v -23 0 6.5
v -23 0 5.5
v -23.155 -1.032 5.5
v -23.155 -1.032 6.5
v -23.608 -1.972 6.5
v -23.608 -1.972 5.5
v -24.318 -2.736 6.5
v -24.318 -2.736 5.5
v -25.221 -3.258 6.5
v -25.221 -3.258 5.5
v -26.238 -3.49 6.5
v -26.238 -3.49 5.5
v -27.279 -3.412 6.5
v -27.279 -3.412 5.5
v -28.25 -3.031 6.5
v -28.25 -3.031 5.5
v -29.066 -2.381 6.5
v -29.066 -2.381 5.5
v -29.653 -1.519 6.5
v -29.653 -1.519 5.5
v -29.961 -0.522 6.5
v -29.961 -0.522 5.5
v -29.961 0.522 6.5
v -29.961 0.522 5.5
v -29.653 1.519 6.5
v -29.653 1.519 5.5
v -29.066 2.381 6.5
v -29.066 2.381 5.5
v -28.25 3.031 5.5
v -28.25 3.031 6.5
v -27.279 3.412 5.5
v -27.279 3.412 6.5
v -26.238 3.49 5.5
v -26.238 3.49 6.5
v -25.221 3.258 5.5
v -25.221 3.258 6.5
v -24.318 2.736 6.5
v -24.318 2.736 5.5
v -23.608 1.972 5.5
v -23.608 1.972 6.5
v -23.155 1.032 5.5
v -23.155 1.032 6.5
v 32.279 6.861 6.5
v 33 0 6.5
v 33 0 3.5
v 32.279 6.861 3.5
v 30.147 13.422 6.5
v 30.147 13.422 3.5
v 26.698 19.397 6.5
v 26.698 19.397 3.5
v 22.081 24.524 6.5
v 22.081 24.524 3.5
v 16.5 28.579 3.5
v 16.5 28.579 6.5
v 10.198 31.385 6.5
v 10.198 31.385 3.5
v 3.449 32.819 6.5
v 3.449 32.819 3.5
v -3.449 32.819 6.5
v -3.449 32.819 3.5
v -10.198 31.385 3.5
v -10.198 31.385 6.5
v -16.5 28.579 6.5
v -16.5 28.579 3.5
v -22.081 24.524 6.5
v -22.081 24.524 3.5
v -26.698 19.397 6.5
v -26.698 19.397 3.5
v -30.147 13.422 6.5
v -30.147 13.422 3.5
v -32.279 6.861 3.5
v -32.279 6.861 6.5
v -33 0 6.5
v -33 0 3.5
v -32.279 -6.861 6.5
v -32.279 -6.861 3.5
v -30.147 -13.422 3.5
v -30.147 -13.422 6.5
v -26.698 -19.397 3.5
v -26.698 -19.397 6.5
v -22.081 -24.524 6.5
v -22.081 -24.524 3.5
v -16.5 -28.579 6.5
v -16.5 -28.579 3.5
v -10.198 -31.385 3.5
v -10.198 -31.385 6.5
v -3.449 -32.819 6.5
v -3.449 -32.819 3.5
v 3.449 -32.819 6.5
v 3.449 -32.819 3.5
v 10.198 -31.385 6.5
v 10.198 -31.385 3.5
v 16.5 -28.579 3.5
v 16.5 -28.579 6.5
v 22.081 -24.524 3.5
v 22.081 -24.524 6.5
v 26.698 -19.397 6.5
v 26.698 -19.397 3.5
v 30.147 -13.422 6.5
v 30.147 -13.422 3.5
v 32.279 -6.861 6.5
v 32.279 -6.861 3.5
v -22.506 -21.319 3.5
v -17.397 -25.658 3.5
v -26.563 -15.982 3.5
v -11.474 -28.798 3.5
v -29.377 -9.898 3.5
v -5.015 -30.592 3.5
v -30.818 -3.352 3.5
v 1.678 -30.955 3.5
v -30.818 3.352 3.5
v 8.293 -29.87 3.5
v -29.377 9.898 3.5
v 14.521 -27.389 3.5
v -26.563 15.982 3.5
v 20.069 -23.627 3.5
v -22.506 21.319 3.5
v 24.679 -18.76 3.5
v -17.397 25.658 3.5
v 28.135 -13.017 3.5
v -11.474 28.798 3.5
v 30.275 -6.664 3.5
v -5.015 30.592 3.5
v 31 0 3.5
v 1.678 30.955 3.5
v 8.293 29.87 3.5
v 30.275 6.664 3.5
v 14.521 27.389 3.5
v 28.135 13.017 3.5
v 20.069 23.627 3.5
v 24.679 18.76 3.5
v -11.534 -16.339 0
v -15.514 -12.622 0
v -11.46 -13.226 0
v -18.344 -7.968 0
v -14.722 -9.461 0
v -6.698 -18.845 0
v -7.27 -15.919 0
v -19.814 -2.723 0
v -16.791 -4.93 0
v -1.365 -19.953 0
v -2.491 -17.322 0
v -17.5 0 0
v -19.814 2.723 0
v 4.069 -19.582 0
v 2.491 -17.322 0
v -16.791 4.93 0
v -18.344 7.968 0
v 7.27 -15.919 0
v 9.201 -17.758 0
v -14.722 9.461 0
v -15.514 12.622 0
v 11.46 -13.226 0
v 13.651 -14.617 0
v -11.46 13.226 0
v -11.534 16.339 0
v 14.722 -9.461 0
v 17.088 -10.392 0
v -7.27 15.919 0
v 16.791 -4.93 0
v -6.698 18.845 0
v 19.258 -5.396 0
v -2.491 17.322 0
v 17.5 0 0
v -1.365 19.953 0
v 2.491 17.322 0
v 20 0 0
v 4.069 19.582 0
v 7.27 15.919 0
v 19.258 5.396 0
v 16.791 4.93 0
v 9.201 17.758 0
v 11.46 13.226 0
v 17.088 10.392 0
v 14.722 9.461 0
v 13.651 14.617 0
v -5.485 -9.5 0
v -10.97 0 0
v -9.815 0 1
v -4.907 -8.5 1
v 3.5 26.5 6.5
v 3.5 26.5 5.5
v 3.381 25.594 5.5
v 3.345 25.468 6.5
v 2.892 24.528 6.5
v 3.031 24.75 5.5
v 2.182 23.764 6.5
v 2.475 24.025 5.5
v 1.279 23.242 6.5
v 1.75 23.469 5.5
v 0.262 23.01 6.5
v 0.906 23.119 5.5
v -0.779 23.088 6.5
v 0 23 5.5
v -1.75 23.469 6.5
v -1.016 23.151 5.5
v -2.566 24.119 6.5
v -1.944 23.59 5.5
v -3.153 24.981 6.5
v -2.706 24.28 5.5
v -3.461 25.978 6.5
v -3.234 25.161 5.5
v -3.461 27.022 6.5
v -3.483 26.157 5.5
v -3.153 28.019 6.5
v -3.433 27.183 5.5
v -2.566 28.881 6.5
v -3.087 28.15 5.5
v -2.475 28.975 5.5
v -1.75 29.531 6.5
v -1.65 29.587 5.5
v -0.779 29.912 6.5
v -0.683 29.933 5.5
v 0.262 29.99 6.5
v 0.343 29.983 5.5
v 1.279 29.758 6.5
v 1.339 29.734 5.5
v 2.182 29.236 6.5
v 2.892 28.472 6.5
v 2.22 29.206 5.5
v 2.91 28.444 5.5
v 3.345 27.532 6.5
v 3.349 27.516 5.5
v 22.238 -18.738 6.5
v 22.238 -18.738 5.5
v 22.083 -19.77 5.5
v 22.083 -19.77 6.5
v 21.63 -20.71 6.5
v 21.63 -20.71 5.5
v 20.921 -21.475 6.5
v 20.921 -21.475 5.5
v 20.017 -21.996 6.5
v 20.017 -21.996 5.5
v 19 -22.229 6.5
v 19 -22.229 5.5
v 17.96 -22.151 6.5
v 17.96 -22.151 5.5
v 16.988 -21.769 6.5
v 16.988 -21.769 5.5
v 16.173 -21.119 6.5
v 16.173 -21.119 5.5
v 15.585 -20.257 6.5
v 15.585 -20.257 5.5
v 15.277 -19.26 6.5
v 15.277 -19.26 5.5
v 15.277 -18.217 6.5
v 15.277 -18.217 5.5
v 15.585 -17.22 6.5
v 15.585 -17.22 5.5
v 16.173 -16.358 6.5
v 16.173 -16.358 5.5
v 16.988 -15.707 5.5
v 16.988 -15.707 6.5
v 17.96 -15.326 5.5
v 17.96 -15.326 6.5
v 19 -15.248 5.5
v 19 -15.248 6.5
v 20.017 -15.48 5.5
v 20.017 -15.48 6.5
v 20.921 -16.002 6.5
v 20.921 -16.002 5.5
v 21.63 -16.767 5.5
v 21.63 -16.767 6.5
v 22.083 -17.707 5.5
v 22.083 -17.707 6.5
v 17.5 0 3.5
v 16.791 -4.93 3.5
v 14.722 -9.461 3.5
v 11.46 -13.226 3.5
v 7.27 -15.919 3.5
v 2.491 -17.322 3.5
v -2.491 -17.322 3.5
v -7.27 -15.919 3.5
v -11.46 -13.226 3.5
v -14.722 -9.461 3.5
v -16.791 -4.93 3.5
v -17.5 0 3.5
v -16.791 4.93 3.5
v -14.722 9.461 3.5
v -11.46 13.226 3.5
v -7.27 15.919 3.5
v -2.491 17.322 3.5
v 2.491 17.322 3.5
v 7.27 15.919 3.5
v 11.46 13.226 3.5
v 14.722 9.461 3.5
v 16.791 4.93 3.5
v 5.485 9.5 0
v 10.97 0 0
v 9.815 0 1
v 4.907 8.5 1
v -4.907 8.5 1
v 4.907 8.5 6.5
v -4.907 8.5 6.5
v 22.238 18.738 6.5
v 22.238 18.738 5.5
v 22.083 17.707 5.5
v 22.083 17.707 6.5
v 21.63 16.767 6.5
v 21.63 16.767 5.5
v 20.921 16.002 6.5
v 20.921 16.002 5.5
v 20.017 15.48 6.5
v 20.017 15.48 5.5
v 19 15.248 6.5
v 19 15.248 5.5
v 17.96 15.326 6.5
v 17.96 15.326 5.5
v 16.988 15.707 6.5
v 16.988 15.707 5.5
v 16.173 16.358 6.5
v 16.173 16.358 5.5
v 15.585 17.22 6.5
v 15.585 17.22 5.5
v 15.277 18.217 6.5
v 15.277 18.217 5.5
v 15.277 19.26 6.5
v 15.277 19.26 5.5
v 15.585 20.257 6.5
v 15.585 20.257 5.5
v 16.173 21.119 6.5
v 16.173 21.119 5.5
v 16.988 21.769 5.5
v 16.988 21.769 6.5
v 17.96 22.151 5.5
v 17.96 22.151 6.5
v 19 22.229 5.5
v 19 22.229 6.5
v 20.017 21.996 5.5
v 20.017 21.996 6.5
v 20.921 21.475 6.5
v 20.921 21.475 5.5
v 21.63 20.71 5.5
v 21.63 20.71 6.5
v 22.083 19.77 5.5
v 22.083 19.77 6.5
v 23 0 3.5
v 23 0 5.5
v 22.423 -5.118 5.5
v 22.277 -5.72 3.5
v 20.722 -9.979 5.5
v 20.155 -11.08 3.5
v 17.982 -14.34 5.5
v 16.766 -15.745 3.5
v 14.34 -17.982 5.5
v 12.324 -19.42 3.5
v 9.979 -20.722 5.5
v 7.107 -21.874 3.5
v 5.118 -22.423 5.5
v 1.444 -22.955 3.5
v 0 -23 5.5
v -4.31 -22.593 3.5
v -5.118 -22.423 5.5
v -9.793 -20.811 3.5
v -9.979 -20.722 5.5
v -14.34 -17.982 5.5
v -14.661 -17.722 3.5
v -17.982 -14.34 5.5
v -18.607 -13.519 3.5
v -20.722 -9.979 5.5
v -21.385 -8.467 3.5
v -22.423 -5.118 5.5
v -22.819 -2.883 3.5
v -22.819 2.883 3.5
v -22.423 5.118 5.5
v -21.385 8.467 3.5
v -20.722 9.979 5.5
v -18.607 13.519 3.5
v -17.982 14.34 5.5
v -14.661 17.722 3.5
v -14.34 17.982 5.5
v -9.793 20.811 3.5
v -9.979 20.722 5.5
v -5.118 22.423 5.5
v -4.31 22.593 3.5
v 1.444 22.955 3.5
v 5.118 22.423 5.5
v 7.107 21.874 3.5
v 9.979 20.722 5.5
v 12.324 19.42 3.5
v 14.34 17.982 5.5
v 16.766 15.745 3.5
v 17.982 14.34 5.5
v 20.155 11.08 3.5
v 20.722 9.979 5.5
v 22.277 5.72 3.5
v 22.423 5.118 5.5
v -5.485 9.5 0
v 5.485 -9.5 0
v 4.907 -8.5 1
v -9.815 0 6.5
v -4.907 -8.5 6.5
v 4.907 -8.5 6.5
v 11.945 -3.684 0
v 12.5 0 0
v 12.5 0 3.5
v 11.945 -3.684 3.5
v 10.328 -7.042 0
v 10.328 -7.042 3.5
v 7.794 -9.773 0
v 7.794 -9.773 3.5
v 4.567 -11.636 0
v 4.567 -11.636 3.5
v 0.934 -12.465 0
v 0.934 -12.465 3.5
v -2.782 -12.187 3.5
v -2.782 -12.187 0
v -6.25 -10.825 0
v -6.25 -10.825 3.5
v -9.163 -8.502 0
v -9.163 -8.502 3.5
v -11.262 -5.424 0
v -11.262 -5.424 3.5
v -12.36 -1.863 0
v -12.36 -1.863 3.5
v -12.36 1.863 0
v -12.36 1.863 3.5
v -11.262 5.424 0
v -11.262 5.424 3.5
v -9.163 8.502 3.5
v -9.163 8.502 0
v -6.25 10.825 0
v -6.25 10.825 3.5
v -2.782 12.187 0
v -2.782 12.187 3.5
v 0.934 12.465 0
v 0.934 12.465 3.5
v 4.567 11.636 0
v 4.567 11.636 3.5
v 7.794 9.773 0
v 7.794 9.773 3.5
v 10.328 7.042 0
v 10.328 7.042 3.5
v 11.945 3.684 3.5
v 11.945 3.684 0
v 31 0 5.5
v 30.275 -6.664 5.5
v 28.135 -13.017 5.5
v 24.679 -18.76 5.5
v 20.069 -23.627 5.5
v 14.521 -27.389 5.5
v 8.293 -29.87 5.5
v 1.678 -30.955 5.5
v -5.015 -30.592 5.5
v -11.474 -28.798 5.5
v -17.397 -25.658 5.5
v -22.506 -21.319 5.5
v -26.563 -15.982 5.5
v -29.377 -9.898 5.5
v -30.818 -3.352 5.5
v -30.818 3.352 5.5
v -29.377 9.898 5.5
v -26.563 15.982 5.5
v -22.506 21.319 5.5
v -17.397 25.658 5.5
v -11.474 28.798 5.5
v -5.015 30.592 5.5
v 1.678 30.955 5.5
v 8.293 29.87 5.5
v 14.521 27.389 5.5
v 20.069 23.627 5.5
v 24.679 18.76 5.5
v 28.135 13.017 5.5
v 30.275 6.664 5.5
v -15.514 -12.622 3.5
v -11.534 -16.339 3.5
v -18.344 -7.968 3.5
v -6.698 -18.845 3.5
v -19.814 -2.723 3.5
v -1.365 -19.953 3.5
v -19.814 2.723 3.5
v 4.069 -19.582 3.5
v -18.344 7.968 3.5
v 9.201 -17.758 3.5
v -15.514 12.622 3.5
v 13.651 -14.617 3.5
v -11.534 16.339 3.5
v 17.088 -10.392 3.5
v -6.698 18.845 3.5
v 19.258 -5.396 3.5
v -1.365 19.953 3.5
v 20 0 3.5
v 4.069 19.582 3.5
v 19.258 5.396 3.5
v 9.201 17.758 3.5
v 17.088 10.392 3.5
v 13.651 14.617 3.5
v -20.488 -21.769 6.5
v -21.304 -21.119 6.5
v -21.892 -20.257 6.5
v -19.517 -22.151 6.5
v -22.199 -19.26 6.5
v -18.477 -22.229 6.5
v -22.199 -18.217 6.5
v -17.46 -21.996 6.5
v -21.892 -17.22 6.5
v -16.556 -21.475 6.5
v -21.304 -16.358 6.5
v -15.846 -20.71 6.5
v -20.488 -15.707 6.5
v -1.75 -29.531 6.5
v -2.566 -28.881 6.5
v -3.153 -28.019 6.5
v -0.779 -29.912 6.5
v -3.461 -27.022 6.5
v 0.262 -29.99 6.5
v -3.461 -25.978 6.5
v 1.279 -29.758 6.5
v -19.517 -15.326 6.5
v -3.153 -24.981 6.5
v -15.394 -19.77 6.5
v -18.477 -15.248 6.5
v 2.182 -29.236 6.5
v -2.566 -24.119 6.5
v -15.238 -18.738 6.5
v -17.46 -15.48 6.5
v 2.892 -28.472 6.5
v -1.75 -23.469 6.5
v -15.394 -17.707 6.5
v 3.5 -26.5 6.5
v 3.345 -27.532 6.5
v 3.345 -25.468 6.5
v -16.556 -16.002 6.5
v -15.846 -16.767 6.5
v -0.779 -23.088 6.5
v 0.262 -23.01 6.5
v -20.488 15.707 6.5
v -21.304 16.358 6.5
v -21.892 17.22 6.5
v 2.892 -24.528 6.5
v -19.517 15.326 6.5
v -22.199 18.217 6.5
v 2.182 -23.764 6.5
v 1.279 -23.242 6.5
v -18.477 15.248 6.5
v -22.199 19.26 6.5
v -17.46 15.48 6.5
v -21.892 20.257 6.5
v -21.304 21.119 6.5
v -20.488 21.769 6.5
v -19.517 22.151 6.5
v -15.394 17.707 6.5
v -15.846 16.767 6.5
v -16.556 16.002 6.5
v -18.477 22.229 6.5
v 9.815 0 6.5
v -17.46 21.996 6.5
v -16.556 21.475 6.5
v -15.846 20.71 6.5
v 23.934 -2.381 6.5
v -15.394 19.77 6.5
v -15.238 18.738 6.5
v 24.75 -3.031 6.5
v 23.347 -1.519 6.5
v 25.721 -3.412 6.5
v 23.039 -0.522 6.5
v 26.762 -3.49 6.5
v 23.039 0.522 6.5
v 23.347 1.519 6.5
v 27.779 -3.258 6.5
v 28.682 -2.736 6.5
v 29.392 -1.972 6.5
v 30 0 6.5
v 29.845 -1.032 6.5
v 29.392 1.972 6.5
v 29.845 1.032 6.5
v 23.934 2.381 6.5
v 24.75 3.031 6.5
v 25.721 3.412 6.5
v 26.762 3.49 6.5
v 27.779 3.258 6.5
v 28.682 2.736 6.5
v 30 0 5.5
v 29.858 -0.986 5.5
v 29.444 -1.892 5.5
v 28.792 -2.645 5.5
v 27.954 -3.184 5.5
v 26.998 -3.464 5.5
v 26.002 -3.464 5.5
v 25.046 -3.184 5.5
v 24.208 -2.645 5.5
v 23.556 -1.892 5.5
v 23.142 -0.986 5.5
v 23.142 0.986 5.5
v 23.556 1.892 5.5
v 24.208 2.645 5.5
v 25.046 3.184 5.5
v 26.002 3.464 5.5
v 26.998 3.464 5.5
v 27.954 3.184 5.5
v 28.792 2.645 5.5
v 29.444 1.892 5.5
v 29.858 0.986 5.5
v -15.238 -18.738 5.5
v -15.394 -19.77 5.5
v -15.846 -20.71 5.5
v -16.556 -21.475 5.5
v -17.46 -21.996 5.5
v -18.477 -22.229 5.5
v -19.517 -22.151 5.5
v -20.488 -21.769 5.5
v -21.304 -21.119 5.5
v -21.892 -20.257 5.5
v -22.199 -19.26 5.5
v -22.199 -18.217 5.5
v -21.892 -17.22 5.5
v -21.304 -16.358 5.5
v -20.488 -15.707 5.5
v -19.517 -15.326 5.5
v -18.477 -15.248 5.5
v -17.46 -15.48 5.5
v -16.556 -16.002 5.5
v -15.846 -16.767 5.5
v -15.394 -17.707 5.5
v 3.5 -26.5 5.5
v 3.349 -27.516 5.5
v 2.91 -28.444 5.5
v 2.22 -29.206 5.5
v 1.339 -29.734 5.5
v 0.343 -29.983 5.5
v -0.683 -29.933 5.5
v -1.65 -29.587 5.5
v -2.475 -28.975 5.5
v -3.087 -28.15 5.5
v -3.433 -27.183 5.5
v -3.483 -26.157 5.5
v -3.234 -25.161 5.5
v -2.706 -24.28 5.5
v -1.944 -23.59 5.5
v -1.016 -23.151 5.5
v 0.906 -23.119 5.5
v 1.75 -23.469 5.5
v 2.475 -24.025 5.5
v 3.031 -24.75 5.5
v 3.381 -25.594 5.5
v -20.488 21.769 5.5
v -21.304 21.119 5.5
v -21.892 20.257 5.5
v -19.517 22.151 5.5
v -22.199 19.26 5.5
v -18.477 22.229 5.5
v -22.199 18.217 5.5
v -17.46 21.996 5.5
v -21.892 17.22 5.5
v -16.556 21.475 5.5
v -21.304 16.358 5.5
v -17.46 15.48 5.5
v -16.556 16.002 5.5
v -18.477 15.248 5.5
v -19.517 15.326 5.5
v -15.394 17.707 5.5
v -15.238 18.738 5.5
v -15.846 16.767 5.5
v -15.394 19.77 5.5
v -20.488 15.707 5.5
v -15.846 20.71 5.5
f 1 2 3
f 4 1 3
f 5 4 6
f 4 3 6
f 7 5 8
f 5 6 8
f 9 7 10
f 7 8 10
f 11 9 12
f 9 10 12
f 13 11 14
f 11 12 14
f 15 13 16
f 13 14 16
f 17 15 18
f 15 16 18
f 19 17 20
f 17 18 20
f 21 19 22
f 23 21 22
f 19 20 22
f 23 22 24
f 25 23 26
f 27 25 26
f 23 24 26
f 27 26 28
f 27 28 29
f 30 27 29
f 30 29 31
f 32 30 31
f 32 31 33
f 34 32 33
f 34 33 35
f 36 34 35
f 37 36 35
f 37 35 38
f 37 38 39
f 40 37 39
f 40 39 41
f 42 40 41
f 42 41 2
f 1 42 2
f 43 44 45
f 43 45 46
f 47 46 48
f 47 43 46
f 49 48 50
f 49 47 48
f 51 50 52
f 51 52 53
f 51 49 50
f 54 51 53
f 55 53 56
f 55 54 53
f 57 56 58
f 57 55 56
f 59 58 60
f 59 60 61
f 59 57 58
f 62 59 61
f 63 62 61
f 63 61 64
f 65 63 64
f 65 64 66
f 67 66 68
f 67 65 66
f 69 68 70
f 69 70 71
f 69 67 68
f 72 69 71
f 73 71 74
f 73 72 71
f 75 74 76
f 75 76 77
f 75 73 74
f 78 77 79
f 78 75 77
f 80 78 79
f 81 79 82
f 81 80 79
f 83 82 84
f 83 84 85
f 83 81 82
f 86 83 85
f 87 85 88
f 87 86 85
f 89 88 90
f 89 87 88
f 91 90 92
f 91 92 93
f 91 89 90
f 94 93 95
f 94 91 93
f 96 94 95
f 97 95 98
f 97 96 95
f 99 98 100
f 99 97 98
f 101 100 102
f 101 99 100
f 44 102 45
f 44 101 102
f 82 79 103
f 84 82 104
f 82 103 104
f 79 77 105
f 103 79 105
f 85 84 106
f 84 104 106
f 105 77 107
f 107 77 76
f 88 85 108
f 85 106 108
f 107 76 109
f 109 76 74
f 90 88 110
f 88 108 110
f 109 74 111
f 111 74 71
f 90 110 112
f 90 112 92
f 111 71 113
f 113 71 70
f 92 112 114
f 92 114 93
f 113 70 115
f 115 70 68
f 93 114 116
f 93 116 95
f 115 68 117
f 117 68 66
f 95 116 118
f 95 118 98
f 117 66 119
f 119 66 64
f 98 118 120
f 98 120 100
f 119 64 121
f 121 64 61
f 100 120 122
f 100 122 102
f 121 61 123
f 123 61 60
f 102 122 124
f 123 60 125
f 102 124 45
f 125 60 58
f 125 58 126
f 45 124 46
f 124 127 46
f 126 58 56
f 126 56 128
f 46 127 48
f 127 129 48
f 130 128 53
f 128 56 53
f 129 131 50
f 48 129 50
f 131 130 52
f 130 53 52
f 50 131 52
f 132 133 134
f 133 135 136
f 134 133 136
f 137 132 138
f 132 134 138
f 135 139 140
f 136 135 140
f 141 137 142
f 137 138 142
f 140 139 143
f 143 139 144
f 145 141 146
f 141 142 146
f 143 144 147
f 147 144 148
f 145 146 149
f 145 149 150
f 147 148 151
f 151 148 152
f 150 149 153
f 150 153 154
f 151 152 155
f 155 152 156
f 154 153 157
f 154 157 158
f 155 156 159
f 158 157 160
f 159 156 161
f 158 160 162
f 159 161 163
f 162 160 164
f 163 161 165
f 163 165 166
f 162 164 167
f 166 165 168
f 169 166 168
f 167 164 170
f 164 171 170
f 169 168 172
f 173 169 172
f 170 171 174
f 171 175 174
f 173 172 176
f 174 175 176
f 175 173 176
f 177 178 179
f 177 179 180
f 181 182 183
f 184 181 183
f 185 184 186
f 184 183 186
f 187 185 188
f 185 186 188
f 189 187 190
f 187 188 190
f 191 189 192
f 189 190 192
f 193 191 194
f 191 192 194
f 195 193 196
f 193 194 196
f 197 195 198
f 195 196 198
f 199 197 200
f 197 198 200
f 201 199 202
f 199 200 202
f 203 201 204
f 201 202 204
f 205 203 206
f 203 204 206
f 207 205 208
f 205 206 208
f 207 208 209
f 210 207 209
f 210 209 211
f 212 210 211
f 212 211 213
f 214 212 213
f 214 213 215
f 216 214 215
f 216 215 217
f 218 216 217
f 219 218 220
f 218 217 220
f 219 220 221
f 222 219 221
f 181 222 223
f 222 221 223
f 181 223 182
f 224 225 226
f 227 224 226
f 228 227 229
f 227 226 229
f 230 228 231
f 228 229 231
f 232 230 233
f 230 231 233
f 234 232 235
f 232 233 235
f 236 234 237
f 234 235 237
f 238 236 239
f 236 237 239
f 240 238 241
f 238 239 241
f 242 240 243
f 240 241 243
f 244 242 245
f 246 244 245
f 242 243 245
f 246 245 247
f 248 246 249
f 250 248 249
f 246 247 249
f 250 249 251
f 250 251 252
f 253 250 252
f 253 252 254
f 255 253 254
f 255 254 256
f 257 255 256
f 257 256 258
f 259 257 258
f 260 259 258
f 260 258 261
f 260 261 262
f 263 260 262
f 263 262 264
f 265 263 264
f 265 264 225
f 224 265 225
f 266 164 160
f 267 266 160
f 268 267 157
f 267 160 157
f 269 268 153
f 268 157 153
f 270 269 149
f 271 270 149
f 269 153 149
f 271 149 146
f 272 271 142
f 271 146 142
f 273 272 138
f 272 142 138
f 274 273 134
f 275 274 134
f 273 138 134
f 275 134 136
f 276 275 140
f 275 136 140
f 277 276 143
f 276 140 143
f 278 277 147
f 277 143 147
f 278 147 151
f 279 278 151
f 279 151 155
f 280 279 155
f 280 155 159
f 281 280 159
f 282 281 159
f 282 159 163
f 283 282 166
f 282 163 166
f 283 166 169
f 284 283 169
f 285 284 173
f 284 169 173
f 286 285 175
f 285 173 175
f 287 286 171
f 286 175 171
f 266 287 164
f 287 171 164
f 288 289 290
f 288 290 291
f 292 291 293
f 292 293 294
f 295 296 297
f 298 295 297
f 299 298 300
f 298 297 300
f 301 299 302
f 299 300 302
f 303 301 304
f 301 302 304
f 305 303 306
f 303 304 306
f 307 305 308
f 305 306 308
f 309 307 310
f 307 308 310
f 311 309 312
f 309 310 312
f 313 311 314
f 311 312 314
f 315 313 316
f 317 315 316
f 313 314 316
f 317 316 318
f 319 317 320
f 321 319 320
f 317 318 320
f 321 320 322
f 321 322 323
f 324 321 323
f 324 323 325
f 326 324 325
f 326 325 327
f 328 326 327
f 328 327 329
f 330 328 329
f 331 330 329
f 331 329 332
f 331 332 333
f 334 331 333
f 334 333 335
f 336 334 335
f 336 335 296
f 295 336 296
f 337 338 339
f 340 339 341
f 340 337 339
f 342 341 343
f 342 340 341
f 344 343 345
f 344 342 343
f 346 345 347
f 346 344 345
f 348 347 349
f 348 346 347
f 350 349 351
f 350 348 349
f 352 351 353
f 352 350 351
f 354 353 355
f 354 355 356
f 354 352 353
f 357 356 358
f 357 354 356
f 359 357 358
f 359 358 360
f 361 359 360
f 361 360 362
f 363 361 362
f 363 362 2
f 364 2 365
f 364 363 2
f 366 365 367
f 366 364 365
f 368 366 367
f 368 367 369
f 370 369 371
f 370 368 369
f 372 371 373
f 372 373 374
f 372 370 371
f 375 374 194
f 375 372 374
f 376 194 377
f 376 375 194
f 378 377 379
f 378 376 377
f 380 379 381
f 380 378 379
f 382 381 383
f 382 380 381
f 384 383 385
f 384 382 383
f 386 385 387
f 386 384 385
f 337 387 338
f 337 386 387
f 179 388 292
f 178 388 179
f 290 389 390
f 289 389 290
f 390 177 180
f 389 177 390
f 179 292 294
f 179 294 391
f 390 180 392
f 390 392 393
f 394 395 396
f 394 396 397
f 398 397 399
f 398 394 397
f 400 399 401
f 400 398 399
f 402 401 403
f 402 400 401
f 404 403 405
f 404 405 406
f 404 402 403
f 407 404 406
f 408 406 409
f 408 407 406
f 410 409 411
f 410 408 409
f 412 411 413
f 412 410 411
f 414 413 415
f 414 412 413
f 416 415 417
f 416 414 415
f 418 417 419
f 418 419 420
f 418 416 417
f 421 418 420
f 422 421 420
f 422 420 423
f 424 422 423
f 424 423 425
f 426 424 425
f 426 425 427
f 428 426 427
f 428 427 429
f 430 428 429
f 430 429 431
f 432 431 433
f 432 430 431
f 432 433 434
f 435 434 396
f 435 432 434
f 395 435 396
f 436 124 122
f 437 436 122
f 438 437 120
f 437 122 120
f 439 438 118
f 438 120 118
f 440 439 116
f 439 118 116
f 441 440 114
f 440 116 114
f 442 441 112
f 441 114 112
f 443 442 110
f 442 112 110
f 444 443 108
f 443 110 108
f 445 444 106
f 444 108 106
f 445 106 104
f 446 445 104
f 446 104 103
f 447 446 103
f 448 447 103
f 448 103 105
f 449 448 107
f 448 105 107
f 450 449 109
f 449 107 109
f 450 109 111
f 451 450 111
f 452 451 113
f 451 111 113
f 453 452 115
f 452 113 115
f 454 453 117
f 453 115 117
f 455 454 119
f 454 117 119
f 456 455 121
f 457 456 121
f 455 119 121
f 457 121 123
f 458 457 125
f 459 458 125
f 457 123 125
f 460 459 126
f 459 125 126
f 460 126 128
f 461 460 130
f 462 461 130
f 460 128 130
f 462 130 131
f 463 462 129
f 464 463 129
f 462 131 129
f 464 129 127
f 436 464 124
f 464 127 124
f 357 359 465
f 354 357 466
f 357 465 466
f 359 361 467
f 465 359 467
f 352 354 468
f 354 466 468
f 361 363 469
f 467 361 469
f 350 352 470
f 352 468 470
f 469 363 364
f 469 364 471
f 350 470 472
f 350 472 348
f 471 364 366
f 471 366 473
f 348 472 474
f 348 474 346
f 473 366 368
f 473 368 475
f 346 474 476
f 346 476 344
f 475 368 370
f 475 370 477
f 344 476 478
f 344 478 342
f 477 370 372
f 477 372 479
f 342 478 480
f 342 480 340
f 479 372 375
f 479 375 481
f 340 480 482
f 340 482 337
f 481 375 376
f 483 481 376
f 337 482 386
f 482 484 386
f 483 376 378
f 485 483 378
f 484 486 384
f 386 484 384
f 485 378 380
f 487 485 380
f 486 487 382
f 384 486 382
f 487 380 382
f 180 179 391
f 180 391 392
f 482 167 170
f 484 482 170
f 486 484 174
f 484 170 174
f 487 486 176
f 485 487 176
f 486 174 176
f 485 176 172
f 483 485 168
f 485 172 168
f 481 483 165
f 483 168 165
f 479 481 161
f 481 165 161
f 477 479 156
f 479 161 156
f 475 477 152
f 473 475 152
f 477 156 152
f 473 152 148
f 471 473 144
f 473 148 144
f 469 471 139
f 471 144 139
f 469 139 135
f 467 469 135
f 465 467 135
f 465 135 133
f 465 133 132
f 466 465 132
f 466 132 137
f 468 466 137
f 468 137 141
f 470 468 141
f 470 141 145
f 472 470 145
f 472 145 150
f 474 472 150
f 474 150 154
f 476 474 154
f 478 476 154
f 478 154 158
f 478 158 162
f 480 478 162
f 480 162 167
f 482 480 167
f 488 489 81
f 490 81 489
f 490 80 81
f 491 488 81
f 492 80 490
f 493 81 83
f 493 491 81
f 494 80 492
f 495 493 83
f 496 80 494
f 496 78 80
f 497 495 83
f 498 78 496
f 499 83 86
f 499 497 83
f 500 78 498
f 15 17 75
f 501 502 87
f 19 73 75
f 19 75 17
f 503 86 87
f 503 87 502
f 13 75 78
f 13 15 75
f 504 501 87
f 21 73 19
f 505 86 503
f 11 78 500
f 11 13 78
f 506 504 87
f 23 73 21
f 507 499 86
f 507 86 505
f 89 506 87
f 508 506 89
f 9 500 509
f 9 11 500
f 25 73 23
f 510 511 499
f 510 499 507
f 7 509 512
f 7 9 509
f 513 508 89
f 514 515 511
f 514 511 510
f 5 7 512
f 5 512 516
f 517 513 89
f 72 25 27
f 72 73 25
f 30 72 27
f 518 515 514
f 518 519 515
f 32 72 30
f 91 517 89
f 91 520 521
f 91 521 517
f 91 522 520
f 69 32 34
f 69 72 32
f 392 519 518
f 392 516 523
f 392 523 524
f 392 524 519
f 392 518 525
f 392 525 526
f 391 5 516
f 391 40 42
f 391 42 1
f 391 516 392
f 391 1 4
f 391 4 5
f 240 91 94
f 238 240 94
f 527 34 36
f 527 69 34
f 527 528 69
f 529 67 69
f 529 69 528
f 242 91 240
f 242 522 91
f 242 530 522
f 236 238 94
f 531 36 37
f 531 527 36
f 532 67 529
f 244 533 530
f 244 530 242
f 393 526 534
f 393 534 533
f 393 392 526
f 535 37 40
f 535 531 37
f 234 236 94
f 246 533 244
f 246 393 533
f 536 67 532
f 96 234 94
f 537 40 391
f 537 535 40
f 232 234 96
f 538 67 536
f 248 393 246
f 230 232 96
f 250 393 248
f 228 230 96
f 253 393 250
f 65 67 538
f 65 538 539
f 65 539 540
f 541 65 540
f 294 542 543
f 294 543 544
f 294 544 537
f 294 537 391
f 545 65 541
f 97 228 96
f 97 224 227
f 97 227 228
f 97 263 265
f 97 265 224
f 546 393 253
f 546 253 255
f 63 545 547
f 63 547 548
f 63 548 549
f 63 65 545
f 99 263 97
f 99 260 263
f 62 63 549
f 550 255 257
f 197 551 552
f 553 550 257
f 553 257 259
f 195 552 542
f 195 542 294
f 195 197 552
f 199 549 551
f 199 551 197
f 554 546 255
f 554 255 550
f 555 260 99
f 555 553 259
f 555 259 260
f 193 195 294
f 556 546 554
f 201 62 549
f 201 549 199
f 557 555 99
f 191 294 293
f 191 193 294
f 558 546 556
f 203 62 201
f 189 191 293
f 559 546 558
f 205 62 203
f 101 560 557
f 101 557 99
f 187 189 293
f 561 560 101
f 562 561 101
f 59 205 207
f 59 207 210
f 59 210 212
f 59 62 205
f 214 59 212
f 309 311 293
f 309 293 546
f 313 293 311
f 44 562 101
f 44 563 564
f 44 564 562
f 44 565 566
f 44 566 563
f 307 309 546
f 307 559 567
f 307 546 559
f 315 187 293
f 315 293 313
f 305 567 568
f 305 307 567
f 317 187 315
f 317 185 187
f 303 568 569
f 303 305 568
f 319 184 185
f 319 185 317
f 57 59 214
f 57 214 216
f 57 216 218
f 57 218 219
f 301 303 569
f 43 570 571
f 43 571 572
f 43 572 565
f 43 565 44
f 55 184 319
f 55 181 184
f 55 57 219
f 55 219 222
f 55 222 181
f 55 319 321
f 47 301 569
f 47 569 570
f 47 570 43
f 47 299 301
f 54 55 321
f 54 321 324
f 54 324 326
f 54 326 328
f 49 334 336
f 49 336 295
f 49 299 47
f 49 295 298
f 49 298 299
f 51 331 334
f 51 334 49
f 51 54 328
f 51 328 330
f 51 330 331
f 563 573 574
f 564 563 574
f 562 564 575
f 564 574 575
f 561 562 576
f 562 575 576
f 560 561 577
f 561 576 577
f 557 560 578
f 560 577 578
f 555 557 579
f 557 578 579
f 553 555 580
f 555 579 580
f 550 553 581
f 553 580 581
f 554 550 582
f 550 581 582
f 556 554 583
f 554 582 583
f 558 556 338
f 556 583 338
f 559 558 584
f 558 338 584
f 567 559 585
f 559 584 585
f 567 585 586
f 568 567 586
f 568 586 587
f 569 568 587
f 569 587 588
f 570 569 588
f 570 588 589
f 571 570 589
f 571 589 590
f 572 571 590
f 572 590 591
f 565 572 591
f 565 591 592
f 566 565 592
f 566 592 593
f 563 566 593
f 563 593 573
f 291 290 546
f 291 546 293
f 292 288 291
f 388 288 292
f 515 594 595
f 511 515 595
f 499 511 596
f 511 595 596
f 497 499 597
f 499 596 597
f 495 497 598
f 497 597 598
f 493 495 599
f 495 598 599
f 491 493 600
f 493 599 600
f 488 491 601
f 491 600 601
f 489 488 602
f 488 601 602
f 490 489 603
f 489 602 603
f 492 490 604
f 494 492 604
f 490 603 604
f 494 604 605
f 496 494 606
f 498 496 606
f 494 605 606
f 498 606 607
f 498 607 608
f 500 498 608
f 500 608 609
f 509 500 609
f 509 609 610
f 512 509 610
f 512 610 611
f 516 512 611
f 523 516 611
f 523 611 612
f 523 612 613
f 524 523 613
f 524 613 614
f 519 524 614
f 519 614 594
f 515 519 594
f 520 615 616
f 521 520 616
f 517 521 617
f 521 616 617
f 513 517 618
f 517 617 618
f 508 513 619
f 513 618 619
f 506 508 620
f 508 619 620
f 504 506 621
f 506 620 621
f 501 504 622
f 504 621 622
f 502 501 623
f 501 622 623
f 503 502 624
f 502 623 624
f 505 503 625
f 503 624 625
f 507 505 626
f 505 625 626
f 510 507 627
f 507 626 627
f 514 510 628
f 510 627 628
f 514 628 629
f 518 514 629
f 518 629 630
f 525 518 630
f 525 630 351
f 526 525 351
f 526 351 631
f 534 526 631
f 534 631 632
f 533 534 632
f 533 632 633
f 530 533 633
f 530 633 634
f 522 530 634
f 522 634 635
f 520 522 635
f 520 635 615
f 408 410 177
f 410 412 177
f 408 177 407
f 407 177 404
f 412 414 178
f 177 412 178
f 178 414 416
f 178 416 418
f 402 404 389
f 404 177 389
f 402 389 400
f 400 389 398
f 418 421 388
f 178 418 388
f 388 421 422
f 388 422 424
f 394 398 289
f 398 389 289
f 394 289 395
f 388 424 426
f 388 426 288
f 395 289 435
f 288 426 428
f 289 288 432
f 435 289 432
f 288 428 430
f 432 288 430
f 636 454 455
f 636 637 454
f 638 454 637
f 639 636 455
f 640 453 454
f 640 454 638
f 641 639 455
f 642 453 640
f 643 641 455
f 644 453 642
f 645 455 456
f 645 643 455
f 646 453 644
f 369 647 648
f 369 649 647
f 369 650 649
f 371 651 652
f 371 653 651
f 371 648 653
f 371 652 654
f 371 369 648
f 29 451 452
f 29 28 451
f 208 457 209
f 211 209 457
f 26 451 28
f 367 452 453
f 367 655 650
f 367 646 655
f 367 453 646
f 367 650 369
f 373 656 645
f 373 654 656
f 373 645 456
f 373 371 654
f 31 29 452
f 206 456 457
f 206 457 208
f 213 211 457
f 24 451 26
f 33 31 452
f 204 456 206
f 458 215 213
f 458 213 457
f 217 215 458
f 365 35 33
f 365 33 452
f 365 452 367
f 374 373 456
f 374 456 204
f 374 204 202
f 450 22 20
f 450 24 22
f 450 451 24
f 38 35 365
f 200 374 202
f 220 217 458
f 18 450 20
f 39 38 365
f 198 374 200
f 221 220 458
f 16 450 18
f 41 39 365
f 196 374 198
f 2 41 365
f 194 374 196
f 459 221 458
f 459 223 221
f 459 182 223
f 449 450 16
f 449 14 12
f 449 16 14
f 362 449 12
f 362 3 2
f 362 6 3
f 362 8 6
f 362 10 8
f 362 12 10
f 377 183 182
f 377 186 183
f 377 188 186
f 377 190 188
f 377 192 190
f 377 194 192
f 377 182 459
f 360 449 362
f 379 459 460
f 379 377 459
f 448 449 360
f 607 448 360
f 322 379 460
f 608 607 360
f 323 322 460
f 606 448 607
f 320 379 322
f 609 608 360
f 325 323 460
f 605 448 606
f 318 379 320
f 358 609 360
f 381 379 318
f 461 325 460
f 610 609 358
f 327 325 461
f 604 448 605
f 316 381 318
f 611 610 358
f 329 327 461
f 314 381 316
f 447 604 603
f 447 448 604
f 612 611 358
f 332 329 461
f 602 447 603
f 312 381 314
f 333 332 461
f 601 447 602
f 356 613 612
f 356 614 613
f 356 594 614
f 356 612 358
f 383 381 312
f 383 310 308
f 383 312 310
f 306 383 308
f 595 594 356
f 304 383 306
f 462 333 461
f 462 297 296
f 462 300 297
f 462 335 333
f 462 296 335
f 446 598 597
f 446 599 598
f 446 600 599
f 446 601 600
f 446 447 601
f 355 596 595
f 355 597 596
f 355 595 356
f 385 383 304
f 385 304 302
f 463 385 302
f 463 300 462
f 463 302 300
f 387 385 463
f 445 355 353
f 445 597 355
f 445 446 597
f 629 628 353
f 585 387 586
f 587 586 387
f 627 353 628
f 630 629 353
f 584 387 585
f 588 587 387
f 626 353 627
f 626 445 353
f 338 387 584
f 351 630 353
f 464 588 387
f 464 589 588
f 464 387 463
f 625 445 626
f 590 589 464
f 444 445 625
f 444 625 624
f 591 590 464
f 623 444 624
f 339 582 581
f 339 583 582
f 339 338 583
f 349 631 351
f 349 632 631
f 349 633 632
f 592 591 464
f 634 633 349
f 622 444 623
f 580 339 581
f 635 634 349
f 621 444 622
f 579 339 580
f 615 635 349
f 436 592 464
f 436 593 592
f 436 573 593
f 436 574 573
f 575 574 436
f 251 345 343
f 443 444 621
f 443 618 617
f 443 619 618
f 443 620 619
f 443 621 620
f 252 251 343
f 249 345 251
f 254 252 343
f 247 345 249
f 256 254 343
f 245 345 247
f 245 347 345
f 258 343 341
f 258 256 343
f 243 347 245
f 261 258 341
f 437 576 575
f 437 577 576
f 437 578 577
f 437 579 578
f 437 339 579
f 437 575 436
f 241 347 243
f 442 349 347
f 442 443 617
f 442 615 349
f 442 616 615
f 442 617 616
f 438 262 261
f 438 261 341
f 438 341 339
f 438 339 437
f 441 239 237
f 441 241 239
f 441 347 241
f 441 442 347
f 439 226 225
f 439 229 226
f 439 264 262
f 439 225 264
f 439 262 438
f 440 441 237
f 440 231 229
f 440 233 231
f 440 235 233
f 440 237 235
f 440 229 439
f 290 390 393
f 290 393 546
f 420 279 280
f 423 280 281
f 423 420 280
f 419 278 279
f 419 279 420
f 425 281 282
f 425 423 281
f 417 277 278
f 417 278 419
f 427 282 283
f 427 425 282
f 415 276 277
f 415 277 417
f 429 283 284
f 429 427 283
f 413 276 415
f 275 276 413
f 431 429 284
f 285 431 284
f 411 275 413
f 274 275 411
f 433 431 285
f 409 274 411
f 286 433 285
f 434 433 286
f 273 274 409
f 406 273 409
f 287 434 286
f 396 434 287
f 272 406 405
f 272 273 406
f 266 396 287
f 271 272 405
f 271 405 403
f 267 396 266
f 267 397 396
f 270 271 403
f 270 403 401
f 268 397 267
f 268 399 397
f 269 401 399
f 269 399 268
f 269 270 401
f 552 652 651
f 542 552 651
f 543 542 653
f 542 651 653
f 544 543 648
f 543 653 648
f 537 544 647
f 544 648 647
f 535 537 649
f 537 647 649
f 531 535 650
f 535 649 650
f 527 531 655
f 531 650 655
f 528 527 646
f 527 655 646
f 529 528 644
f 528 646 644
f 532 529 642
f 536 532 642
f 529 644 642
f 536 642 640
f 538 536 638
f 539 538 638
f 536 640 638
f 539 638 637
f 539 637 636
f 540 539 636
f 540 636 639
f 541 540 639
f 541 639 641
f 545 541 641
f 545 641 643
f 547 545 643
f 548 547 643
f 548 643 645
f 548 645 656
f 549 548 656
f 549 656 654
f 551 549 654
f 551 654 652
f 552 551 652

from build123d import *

# Parameters (mm, degrees)
SKETCH_R        = 20
PAD_DEPTH       = 6.5
SKETCH001_R     = 33
SKETCH001_R_2   = 20
PAD001_DEPTH    = 3
SKETCH002_R     = 3.5
POCKET_DEPTH    = 5
SKETCH003_R     = 31
SKETCH003_R_2   = 23
POCKET001_DEPTH = 2
SKETCH004_R     = 17.5
SKETCH004_R_2   = 12.5
POCKET002_DEPTH = 3.5
CHAMFER_SIZE    = 1


with BuildPart() as part:
    # Sketch → Pad (new body)
    with BuildSketch(Plane.XY):
        Circle(SKETCH_R)
        Polygon((4.907477, 8.5), (-4.907477, 8.5), (-9.814955, 0), (-4.907477, -8.5), (4.907477, -8.5), (9.814955, 0), align=None, mode=Mode.SUBTRACT)
    extrude(amount=PAD_DEPTH)

    # Sketch001 (on Face9 of Pad) → Pad001 (join)
    with BuildSketch(Plane.XY.offset(6.5)):
        Circle(SKETCH001_R)
        Circle(SKETCH001_R_2, mode=Mode.SUBTRACT)
    extrude(amount=-PAD001_DEPTH)

    # Sketch002 (on Face3 of Pad001) → Pocket (cut)
    with BuildSketch(Plane(origin=(0, 0, 3.5), x_dir=(1, 0, 0), z_dir=(0, 0, -1))):
        with Locations((0, 26.5)):
            Circle(SKETCH002_R)
        with Locations((18.73833, 18.73833)):
            Circle(SKETCH002_R)
        with Locations((26.5, 0)):
            Circle(SKETCH002_R)
        with Locations((18.73833, -18.73833)):
            Circle(SKETCH002_R)
        with Locations((0, -26.5)):
            Circle(SKETCH002_R)
        with Locations((-18.73833, -18.73833)):
            Circle(SKETCH002_R)
        with Locations((-26.5, 0)):
            Circle(SKETCH002_R)
        with Locations((-18.73833, 18.73833)):
            Circle(SKETCH002_R)
    extrude(amount=-POCKET_DEPTH, mode=Mode.SUBTRACT)

    # Sketch003 (on Face3 of Pocket) → Pocket001 (cut)
    with BuildSketch(Plane(origin=(0, 0, 3.5), x_dir=(1, 0, 0), z_dir=(0, 0, -1))):
        Circle(SKETCH003_R)
        Circle(SKETCH003_R_2, mode=Mode.SUBTRACT)
    extrude(amount=-POCKET001_DEPTH, mode=Mode.SUBTRACT)

    # Sketch004 (on Face2 of Pocket001) → Pocket002 (cut)
    with BuildSketch(Plane(origin=(0, 0, 0), x_dir=(1, 0, 0), z_dir=(0, 0, -1))):
        Circle(SKETCH004_R)
        Circle(SKETCH004_R_2, mode=Mode.SUBTRACT)
    extrude(amount=-POCKET002_DEPTH, mode=Mode.SUBTRACT)

    # Chamfer
    chamfer_edges = [part.edges().sort_by_distance(p)[0] for p in [
        (7.361216, 4.25, 0),
        (0, 8.5, 0),
        (-7.361216, 4.25, 0),
        (-7.361216, -4.25, 0),
        (0, -8.5, 0),
        (7.361216, -4.25, 0),
    ]]
    chamfer(chamfer_edges, length=CHAMFER_SIZE)


solid = part.part
